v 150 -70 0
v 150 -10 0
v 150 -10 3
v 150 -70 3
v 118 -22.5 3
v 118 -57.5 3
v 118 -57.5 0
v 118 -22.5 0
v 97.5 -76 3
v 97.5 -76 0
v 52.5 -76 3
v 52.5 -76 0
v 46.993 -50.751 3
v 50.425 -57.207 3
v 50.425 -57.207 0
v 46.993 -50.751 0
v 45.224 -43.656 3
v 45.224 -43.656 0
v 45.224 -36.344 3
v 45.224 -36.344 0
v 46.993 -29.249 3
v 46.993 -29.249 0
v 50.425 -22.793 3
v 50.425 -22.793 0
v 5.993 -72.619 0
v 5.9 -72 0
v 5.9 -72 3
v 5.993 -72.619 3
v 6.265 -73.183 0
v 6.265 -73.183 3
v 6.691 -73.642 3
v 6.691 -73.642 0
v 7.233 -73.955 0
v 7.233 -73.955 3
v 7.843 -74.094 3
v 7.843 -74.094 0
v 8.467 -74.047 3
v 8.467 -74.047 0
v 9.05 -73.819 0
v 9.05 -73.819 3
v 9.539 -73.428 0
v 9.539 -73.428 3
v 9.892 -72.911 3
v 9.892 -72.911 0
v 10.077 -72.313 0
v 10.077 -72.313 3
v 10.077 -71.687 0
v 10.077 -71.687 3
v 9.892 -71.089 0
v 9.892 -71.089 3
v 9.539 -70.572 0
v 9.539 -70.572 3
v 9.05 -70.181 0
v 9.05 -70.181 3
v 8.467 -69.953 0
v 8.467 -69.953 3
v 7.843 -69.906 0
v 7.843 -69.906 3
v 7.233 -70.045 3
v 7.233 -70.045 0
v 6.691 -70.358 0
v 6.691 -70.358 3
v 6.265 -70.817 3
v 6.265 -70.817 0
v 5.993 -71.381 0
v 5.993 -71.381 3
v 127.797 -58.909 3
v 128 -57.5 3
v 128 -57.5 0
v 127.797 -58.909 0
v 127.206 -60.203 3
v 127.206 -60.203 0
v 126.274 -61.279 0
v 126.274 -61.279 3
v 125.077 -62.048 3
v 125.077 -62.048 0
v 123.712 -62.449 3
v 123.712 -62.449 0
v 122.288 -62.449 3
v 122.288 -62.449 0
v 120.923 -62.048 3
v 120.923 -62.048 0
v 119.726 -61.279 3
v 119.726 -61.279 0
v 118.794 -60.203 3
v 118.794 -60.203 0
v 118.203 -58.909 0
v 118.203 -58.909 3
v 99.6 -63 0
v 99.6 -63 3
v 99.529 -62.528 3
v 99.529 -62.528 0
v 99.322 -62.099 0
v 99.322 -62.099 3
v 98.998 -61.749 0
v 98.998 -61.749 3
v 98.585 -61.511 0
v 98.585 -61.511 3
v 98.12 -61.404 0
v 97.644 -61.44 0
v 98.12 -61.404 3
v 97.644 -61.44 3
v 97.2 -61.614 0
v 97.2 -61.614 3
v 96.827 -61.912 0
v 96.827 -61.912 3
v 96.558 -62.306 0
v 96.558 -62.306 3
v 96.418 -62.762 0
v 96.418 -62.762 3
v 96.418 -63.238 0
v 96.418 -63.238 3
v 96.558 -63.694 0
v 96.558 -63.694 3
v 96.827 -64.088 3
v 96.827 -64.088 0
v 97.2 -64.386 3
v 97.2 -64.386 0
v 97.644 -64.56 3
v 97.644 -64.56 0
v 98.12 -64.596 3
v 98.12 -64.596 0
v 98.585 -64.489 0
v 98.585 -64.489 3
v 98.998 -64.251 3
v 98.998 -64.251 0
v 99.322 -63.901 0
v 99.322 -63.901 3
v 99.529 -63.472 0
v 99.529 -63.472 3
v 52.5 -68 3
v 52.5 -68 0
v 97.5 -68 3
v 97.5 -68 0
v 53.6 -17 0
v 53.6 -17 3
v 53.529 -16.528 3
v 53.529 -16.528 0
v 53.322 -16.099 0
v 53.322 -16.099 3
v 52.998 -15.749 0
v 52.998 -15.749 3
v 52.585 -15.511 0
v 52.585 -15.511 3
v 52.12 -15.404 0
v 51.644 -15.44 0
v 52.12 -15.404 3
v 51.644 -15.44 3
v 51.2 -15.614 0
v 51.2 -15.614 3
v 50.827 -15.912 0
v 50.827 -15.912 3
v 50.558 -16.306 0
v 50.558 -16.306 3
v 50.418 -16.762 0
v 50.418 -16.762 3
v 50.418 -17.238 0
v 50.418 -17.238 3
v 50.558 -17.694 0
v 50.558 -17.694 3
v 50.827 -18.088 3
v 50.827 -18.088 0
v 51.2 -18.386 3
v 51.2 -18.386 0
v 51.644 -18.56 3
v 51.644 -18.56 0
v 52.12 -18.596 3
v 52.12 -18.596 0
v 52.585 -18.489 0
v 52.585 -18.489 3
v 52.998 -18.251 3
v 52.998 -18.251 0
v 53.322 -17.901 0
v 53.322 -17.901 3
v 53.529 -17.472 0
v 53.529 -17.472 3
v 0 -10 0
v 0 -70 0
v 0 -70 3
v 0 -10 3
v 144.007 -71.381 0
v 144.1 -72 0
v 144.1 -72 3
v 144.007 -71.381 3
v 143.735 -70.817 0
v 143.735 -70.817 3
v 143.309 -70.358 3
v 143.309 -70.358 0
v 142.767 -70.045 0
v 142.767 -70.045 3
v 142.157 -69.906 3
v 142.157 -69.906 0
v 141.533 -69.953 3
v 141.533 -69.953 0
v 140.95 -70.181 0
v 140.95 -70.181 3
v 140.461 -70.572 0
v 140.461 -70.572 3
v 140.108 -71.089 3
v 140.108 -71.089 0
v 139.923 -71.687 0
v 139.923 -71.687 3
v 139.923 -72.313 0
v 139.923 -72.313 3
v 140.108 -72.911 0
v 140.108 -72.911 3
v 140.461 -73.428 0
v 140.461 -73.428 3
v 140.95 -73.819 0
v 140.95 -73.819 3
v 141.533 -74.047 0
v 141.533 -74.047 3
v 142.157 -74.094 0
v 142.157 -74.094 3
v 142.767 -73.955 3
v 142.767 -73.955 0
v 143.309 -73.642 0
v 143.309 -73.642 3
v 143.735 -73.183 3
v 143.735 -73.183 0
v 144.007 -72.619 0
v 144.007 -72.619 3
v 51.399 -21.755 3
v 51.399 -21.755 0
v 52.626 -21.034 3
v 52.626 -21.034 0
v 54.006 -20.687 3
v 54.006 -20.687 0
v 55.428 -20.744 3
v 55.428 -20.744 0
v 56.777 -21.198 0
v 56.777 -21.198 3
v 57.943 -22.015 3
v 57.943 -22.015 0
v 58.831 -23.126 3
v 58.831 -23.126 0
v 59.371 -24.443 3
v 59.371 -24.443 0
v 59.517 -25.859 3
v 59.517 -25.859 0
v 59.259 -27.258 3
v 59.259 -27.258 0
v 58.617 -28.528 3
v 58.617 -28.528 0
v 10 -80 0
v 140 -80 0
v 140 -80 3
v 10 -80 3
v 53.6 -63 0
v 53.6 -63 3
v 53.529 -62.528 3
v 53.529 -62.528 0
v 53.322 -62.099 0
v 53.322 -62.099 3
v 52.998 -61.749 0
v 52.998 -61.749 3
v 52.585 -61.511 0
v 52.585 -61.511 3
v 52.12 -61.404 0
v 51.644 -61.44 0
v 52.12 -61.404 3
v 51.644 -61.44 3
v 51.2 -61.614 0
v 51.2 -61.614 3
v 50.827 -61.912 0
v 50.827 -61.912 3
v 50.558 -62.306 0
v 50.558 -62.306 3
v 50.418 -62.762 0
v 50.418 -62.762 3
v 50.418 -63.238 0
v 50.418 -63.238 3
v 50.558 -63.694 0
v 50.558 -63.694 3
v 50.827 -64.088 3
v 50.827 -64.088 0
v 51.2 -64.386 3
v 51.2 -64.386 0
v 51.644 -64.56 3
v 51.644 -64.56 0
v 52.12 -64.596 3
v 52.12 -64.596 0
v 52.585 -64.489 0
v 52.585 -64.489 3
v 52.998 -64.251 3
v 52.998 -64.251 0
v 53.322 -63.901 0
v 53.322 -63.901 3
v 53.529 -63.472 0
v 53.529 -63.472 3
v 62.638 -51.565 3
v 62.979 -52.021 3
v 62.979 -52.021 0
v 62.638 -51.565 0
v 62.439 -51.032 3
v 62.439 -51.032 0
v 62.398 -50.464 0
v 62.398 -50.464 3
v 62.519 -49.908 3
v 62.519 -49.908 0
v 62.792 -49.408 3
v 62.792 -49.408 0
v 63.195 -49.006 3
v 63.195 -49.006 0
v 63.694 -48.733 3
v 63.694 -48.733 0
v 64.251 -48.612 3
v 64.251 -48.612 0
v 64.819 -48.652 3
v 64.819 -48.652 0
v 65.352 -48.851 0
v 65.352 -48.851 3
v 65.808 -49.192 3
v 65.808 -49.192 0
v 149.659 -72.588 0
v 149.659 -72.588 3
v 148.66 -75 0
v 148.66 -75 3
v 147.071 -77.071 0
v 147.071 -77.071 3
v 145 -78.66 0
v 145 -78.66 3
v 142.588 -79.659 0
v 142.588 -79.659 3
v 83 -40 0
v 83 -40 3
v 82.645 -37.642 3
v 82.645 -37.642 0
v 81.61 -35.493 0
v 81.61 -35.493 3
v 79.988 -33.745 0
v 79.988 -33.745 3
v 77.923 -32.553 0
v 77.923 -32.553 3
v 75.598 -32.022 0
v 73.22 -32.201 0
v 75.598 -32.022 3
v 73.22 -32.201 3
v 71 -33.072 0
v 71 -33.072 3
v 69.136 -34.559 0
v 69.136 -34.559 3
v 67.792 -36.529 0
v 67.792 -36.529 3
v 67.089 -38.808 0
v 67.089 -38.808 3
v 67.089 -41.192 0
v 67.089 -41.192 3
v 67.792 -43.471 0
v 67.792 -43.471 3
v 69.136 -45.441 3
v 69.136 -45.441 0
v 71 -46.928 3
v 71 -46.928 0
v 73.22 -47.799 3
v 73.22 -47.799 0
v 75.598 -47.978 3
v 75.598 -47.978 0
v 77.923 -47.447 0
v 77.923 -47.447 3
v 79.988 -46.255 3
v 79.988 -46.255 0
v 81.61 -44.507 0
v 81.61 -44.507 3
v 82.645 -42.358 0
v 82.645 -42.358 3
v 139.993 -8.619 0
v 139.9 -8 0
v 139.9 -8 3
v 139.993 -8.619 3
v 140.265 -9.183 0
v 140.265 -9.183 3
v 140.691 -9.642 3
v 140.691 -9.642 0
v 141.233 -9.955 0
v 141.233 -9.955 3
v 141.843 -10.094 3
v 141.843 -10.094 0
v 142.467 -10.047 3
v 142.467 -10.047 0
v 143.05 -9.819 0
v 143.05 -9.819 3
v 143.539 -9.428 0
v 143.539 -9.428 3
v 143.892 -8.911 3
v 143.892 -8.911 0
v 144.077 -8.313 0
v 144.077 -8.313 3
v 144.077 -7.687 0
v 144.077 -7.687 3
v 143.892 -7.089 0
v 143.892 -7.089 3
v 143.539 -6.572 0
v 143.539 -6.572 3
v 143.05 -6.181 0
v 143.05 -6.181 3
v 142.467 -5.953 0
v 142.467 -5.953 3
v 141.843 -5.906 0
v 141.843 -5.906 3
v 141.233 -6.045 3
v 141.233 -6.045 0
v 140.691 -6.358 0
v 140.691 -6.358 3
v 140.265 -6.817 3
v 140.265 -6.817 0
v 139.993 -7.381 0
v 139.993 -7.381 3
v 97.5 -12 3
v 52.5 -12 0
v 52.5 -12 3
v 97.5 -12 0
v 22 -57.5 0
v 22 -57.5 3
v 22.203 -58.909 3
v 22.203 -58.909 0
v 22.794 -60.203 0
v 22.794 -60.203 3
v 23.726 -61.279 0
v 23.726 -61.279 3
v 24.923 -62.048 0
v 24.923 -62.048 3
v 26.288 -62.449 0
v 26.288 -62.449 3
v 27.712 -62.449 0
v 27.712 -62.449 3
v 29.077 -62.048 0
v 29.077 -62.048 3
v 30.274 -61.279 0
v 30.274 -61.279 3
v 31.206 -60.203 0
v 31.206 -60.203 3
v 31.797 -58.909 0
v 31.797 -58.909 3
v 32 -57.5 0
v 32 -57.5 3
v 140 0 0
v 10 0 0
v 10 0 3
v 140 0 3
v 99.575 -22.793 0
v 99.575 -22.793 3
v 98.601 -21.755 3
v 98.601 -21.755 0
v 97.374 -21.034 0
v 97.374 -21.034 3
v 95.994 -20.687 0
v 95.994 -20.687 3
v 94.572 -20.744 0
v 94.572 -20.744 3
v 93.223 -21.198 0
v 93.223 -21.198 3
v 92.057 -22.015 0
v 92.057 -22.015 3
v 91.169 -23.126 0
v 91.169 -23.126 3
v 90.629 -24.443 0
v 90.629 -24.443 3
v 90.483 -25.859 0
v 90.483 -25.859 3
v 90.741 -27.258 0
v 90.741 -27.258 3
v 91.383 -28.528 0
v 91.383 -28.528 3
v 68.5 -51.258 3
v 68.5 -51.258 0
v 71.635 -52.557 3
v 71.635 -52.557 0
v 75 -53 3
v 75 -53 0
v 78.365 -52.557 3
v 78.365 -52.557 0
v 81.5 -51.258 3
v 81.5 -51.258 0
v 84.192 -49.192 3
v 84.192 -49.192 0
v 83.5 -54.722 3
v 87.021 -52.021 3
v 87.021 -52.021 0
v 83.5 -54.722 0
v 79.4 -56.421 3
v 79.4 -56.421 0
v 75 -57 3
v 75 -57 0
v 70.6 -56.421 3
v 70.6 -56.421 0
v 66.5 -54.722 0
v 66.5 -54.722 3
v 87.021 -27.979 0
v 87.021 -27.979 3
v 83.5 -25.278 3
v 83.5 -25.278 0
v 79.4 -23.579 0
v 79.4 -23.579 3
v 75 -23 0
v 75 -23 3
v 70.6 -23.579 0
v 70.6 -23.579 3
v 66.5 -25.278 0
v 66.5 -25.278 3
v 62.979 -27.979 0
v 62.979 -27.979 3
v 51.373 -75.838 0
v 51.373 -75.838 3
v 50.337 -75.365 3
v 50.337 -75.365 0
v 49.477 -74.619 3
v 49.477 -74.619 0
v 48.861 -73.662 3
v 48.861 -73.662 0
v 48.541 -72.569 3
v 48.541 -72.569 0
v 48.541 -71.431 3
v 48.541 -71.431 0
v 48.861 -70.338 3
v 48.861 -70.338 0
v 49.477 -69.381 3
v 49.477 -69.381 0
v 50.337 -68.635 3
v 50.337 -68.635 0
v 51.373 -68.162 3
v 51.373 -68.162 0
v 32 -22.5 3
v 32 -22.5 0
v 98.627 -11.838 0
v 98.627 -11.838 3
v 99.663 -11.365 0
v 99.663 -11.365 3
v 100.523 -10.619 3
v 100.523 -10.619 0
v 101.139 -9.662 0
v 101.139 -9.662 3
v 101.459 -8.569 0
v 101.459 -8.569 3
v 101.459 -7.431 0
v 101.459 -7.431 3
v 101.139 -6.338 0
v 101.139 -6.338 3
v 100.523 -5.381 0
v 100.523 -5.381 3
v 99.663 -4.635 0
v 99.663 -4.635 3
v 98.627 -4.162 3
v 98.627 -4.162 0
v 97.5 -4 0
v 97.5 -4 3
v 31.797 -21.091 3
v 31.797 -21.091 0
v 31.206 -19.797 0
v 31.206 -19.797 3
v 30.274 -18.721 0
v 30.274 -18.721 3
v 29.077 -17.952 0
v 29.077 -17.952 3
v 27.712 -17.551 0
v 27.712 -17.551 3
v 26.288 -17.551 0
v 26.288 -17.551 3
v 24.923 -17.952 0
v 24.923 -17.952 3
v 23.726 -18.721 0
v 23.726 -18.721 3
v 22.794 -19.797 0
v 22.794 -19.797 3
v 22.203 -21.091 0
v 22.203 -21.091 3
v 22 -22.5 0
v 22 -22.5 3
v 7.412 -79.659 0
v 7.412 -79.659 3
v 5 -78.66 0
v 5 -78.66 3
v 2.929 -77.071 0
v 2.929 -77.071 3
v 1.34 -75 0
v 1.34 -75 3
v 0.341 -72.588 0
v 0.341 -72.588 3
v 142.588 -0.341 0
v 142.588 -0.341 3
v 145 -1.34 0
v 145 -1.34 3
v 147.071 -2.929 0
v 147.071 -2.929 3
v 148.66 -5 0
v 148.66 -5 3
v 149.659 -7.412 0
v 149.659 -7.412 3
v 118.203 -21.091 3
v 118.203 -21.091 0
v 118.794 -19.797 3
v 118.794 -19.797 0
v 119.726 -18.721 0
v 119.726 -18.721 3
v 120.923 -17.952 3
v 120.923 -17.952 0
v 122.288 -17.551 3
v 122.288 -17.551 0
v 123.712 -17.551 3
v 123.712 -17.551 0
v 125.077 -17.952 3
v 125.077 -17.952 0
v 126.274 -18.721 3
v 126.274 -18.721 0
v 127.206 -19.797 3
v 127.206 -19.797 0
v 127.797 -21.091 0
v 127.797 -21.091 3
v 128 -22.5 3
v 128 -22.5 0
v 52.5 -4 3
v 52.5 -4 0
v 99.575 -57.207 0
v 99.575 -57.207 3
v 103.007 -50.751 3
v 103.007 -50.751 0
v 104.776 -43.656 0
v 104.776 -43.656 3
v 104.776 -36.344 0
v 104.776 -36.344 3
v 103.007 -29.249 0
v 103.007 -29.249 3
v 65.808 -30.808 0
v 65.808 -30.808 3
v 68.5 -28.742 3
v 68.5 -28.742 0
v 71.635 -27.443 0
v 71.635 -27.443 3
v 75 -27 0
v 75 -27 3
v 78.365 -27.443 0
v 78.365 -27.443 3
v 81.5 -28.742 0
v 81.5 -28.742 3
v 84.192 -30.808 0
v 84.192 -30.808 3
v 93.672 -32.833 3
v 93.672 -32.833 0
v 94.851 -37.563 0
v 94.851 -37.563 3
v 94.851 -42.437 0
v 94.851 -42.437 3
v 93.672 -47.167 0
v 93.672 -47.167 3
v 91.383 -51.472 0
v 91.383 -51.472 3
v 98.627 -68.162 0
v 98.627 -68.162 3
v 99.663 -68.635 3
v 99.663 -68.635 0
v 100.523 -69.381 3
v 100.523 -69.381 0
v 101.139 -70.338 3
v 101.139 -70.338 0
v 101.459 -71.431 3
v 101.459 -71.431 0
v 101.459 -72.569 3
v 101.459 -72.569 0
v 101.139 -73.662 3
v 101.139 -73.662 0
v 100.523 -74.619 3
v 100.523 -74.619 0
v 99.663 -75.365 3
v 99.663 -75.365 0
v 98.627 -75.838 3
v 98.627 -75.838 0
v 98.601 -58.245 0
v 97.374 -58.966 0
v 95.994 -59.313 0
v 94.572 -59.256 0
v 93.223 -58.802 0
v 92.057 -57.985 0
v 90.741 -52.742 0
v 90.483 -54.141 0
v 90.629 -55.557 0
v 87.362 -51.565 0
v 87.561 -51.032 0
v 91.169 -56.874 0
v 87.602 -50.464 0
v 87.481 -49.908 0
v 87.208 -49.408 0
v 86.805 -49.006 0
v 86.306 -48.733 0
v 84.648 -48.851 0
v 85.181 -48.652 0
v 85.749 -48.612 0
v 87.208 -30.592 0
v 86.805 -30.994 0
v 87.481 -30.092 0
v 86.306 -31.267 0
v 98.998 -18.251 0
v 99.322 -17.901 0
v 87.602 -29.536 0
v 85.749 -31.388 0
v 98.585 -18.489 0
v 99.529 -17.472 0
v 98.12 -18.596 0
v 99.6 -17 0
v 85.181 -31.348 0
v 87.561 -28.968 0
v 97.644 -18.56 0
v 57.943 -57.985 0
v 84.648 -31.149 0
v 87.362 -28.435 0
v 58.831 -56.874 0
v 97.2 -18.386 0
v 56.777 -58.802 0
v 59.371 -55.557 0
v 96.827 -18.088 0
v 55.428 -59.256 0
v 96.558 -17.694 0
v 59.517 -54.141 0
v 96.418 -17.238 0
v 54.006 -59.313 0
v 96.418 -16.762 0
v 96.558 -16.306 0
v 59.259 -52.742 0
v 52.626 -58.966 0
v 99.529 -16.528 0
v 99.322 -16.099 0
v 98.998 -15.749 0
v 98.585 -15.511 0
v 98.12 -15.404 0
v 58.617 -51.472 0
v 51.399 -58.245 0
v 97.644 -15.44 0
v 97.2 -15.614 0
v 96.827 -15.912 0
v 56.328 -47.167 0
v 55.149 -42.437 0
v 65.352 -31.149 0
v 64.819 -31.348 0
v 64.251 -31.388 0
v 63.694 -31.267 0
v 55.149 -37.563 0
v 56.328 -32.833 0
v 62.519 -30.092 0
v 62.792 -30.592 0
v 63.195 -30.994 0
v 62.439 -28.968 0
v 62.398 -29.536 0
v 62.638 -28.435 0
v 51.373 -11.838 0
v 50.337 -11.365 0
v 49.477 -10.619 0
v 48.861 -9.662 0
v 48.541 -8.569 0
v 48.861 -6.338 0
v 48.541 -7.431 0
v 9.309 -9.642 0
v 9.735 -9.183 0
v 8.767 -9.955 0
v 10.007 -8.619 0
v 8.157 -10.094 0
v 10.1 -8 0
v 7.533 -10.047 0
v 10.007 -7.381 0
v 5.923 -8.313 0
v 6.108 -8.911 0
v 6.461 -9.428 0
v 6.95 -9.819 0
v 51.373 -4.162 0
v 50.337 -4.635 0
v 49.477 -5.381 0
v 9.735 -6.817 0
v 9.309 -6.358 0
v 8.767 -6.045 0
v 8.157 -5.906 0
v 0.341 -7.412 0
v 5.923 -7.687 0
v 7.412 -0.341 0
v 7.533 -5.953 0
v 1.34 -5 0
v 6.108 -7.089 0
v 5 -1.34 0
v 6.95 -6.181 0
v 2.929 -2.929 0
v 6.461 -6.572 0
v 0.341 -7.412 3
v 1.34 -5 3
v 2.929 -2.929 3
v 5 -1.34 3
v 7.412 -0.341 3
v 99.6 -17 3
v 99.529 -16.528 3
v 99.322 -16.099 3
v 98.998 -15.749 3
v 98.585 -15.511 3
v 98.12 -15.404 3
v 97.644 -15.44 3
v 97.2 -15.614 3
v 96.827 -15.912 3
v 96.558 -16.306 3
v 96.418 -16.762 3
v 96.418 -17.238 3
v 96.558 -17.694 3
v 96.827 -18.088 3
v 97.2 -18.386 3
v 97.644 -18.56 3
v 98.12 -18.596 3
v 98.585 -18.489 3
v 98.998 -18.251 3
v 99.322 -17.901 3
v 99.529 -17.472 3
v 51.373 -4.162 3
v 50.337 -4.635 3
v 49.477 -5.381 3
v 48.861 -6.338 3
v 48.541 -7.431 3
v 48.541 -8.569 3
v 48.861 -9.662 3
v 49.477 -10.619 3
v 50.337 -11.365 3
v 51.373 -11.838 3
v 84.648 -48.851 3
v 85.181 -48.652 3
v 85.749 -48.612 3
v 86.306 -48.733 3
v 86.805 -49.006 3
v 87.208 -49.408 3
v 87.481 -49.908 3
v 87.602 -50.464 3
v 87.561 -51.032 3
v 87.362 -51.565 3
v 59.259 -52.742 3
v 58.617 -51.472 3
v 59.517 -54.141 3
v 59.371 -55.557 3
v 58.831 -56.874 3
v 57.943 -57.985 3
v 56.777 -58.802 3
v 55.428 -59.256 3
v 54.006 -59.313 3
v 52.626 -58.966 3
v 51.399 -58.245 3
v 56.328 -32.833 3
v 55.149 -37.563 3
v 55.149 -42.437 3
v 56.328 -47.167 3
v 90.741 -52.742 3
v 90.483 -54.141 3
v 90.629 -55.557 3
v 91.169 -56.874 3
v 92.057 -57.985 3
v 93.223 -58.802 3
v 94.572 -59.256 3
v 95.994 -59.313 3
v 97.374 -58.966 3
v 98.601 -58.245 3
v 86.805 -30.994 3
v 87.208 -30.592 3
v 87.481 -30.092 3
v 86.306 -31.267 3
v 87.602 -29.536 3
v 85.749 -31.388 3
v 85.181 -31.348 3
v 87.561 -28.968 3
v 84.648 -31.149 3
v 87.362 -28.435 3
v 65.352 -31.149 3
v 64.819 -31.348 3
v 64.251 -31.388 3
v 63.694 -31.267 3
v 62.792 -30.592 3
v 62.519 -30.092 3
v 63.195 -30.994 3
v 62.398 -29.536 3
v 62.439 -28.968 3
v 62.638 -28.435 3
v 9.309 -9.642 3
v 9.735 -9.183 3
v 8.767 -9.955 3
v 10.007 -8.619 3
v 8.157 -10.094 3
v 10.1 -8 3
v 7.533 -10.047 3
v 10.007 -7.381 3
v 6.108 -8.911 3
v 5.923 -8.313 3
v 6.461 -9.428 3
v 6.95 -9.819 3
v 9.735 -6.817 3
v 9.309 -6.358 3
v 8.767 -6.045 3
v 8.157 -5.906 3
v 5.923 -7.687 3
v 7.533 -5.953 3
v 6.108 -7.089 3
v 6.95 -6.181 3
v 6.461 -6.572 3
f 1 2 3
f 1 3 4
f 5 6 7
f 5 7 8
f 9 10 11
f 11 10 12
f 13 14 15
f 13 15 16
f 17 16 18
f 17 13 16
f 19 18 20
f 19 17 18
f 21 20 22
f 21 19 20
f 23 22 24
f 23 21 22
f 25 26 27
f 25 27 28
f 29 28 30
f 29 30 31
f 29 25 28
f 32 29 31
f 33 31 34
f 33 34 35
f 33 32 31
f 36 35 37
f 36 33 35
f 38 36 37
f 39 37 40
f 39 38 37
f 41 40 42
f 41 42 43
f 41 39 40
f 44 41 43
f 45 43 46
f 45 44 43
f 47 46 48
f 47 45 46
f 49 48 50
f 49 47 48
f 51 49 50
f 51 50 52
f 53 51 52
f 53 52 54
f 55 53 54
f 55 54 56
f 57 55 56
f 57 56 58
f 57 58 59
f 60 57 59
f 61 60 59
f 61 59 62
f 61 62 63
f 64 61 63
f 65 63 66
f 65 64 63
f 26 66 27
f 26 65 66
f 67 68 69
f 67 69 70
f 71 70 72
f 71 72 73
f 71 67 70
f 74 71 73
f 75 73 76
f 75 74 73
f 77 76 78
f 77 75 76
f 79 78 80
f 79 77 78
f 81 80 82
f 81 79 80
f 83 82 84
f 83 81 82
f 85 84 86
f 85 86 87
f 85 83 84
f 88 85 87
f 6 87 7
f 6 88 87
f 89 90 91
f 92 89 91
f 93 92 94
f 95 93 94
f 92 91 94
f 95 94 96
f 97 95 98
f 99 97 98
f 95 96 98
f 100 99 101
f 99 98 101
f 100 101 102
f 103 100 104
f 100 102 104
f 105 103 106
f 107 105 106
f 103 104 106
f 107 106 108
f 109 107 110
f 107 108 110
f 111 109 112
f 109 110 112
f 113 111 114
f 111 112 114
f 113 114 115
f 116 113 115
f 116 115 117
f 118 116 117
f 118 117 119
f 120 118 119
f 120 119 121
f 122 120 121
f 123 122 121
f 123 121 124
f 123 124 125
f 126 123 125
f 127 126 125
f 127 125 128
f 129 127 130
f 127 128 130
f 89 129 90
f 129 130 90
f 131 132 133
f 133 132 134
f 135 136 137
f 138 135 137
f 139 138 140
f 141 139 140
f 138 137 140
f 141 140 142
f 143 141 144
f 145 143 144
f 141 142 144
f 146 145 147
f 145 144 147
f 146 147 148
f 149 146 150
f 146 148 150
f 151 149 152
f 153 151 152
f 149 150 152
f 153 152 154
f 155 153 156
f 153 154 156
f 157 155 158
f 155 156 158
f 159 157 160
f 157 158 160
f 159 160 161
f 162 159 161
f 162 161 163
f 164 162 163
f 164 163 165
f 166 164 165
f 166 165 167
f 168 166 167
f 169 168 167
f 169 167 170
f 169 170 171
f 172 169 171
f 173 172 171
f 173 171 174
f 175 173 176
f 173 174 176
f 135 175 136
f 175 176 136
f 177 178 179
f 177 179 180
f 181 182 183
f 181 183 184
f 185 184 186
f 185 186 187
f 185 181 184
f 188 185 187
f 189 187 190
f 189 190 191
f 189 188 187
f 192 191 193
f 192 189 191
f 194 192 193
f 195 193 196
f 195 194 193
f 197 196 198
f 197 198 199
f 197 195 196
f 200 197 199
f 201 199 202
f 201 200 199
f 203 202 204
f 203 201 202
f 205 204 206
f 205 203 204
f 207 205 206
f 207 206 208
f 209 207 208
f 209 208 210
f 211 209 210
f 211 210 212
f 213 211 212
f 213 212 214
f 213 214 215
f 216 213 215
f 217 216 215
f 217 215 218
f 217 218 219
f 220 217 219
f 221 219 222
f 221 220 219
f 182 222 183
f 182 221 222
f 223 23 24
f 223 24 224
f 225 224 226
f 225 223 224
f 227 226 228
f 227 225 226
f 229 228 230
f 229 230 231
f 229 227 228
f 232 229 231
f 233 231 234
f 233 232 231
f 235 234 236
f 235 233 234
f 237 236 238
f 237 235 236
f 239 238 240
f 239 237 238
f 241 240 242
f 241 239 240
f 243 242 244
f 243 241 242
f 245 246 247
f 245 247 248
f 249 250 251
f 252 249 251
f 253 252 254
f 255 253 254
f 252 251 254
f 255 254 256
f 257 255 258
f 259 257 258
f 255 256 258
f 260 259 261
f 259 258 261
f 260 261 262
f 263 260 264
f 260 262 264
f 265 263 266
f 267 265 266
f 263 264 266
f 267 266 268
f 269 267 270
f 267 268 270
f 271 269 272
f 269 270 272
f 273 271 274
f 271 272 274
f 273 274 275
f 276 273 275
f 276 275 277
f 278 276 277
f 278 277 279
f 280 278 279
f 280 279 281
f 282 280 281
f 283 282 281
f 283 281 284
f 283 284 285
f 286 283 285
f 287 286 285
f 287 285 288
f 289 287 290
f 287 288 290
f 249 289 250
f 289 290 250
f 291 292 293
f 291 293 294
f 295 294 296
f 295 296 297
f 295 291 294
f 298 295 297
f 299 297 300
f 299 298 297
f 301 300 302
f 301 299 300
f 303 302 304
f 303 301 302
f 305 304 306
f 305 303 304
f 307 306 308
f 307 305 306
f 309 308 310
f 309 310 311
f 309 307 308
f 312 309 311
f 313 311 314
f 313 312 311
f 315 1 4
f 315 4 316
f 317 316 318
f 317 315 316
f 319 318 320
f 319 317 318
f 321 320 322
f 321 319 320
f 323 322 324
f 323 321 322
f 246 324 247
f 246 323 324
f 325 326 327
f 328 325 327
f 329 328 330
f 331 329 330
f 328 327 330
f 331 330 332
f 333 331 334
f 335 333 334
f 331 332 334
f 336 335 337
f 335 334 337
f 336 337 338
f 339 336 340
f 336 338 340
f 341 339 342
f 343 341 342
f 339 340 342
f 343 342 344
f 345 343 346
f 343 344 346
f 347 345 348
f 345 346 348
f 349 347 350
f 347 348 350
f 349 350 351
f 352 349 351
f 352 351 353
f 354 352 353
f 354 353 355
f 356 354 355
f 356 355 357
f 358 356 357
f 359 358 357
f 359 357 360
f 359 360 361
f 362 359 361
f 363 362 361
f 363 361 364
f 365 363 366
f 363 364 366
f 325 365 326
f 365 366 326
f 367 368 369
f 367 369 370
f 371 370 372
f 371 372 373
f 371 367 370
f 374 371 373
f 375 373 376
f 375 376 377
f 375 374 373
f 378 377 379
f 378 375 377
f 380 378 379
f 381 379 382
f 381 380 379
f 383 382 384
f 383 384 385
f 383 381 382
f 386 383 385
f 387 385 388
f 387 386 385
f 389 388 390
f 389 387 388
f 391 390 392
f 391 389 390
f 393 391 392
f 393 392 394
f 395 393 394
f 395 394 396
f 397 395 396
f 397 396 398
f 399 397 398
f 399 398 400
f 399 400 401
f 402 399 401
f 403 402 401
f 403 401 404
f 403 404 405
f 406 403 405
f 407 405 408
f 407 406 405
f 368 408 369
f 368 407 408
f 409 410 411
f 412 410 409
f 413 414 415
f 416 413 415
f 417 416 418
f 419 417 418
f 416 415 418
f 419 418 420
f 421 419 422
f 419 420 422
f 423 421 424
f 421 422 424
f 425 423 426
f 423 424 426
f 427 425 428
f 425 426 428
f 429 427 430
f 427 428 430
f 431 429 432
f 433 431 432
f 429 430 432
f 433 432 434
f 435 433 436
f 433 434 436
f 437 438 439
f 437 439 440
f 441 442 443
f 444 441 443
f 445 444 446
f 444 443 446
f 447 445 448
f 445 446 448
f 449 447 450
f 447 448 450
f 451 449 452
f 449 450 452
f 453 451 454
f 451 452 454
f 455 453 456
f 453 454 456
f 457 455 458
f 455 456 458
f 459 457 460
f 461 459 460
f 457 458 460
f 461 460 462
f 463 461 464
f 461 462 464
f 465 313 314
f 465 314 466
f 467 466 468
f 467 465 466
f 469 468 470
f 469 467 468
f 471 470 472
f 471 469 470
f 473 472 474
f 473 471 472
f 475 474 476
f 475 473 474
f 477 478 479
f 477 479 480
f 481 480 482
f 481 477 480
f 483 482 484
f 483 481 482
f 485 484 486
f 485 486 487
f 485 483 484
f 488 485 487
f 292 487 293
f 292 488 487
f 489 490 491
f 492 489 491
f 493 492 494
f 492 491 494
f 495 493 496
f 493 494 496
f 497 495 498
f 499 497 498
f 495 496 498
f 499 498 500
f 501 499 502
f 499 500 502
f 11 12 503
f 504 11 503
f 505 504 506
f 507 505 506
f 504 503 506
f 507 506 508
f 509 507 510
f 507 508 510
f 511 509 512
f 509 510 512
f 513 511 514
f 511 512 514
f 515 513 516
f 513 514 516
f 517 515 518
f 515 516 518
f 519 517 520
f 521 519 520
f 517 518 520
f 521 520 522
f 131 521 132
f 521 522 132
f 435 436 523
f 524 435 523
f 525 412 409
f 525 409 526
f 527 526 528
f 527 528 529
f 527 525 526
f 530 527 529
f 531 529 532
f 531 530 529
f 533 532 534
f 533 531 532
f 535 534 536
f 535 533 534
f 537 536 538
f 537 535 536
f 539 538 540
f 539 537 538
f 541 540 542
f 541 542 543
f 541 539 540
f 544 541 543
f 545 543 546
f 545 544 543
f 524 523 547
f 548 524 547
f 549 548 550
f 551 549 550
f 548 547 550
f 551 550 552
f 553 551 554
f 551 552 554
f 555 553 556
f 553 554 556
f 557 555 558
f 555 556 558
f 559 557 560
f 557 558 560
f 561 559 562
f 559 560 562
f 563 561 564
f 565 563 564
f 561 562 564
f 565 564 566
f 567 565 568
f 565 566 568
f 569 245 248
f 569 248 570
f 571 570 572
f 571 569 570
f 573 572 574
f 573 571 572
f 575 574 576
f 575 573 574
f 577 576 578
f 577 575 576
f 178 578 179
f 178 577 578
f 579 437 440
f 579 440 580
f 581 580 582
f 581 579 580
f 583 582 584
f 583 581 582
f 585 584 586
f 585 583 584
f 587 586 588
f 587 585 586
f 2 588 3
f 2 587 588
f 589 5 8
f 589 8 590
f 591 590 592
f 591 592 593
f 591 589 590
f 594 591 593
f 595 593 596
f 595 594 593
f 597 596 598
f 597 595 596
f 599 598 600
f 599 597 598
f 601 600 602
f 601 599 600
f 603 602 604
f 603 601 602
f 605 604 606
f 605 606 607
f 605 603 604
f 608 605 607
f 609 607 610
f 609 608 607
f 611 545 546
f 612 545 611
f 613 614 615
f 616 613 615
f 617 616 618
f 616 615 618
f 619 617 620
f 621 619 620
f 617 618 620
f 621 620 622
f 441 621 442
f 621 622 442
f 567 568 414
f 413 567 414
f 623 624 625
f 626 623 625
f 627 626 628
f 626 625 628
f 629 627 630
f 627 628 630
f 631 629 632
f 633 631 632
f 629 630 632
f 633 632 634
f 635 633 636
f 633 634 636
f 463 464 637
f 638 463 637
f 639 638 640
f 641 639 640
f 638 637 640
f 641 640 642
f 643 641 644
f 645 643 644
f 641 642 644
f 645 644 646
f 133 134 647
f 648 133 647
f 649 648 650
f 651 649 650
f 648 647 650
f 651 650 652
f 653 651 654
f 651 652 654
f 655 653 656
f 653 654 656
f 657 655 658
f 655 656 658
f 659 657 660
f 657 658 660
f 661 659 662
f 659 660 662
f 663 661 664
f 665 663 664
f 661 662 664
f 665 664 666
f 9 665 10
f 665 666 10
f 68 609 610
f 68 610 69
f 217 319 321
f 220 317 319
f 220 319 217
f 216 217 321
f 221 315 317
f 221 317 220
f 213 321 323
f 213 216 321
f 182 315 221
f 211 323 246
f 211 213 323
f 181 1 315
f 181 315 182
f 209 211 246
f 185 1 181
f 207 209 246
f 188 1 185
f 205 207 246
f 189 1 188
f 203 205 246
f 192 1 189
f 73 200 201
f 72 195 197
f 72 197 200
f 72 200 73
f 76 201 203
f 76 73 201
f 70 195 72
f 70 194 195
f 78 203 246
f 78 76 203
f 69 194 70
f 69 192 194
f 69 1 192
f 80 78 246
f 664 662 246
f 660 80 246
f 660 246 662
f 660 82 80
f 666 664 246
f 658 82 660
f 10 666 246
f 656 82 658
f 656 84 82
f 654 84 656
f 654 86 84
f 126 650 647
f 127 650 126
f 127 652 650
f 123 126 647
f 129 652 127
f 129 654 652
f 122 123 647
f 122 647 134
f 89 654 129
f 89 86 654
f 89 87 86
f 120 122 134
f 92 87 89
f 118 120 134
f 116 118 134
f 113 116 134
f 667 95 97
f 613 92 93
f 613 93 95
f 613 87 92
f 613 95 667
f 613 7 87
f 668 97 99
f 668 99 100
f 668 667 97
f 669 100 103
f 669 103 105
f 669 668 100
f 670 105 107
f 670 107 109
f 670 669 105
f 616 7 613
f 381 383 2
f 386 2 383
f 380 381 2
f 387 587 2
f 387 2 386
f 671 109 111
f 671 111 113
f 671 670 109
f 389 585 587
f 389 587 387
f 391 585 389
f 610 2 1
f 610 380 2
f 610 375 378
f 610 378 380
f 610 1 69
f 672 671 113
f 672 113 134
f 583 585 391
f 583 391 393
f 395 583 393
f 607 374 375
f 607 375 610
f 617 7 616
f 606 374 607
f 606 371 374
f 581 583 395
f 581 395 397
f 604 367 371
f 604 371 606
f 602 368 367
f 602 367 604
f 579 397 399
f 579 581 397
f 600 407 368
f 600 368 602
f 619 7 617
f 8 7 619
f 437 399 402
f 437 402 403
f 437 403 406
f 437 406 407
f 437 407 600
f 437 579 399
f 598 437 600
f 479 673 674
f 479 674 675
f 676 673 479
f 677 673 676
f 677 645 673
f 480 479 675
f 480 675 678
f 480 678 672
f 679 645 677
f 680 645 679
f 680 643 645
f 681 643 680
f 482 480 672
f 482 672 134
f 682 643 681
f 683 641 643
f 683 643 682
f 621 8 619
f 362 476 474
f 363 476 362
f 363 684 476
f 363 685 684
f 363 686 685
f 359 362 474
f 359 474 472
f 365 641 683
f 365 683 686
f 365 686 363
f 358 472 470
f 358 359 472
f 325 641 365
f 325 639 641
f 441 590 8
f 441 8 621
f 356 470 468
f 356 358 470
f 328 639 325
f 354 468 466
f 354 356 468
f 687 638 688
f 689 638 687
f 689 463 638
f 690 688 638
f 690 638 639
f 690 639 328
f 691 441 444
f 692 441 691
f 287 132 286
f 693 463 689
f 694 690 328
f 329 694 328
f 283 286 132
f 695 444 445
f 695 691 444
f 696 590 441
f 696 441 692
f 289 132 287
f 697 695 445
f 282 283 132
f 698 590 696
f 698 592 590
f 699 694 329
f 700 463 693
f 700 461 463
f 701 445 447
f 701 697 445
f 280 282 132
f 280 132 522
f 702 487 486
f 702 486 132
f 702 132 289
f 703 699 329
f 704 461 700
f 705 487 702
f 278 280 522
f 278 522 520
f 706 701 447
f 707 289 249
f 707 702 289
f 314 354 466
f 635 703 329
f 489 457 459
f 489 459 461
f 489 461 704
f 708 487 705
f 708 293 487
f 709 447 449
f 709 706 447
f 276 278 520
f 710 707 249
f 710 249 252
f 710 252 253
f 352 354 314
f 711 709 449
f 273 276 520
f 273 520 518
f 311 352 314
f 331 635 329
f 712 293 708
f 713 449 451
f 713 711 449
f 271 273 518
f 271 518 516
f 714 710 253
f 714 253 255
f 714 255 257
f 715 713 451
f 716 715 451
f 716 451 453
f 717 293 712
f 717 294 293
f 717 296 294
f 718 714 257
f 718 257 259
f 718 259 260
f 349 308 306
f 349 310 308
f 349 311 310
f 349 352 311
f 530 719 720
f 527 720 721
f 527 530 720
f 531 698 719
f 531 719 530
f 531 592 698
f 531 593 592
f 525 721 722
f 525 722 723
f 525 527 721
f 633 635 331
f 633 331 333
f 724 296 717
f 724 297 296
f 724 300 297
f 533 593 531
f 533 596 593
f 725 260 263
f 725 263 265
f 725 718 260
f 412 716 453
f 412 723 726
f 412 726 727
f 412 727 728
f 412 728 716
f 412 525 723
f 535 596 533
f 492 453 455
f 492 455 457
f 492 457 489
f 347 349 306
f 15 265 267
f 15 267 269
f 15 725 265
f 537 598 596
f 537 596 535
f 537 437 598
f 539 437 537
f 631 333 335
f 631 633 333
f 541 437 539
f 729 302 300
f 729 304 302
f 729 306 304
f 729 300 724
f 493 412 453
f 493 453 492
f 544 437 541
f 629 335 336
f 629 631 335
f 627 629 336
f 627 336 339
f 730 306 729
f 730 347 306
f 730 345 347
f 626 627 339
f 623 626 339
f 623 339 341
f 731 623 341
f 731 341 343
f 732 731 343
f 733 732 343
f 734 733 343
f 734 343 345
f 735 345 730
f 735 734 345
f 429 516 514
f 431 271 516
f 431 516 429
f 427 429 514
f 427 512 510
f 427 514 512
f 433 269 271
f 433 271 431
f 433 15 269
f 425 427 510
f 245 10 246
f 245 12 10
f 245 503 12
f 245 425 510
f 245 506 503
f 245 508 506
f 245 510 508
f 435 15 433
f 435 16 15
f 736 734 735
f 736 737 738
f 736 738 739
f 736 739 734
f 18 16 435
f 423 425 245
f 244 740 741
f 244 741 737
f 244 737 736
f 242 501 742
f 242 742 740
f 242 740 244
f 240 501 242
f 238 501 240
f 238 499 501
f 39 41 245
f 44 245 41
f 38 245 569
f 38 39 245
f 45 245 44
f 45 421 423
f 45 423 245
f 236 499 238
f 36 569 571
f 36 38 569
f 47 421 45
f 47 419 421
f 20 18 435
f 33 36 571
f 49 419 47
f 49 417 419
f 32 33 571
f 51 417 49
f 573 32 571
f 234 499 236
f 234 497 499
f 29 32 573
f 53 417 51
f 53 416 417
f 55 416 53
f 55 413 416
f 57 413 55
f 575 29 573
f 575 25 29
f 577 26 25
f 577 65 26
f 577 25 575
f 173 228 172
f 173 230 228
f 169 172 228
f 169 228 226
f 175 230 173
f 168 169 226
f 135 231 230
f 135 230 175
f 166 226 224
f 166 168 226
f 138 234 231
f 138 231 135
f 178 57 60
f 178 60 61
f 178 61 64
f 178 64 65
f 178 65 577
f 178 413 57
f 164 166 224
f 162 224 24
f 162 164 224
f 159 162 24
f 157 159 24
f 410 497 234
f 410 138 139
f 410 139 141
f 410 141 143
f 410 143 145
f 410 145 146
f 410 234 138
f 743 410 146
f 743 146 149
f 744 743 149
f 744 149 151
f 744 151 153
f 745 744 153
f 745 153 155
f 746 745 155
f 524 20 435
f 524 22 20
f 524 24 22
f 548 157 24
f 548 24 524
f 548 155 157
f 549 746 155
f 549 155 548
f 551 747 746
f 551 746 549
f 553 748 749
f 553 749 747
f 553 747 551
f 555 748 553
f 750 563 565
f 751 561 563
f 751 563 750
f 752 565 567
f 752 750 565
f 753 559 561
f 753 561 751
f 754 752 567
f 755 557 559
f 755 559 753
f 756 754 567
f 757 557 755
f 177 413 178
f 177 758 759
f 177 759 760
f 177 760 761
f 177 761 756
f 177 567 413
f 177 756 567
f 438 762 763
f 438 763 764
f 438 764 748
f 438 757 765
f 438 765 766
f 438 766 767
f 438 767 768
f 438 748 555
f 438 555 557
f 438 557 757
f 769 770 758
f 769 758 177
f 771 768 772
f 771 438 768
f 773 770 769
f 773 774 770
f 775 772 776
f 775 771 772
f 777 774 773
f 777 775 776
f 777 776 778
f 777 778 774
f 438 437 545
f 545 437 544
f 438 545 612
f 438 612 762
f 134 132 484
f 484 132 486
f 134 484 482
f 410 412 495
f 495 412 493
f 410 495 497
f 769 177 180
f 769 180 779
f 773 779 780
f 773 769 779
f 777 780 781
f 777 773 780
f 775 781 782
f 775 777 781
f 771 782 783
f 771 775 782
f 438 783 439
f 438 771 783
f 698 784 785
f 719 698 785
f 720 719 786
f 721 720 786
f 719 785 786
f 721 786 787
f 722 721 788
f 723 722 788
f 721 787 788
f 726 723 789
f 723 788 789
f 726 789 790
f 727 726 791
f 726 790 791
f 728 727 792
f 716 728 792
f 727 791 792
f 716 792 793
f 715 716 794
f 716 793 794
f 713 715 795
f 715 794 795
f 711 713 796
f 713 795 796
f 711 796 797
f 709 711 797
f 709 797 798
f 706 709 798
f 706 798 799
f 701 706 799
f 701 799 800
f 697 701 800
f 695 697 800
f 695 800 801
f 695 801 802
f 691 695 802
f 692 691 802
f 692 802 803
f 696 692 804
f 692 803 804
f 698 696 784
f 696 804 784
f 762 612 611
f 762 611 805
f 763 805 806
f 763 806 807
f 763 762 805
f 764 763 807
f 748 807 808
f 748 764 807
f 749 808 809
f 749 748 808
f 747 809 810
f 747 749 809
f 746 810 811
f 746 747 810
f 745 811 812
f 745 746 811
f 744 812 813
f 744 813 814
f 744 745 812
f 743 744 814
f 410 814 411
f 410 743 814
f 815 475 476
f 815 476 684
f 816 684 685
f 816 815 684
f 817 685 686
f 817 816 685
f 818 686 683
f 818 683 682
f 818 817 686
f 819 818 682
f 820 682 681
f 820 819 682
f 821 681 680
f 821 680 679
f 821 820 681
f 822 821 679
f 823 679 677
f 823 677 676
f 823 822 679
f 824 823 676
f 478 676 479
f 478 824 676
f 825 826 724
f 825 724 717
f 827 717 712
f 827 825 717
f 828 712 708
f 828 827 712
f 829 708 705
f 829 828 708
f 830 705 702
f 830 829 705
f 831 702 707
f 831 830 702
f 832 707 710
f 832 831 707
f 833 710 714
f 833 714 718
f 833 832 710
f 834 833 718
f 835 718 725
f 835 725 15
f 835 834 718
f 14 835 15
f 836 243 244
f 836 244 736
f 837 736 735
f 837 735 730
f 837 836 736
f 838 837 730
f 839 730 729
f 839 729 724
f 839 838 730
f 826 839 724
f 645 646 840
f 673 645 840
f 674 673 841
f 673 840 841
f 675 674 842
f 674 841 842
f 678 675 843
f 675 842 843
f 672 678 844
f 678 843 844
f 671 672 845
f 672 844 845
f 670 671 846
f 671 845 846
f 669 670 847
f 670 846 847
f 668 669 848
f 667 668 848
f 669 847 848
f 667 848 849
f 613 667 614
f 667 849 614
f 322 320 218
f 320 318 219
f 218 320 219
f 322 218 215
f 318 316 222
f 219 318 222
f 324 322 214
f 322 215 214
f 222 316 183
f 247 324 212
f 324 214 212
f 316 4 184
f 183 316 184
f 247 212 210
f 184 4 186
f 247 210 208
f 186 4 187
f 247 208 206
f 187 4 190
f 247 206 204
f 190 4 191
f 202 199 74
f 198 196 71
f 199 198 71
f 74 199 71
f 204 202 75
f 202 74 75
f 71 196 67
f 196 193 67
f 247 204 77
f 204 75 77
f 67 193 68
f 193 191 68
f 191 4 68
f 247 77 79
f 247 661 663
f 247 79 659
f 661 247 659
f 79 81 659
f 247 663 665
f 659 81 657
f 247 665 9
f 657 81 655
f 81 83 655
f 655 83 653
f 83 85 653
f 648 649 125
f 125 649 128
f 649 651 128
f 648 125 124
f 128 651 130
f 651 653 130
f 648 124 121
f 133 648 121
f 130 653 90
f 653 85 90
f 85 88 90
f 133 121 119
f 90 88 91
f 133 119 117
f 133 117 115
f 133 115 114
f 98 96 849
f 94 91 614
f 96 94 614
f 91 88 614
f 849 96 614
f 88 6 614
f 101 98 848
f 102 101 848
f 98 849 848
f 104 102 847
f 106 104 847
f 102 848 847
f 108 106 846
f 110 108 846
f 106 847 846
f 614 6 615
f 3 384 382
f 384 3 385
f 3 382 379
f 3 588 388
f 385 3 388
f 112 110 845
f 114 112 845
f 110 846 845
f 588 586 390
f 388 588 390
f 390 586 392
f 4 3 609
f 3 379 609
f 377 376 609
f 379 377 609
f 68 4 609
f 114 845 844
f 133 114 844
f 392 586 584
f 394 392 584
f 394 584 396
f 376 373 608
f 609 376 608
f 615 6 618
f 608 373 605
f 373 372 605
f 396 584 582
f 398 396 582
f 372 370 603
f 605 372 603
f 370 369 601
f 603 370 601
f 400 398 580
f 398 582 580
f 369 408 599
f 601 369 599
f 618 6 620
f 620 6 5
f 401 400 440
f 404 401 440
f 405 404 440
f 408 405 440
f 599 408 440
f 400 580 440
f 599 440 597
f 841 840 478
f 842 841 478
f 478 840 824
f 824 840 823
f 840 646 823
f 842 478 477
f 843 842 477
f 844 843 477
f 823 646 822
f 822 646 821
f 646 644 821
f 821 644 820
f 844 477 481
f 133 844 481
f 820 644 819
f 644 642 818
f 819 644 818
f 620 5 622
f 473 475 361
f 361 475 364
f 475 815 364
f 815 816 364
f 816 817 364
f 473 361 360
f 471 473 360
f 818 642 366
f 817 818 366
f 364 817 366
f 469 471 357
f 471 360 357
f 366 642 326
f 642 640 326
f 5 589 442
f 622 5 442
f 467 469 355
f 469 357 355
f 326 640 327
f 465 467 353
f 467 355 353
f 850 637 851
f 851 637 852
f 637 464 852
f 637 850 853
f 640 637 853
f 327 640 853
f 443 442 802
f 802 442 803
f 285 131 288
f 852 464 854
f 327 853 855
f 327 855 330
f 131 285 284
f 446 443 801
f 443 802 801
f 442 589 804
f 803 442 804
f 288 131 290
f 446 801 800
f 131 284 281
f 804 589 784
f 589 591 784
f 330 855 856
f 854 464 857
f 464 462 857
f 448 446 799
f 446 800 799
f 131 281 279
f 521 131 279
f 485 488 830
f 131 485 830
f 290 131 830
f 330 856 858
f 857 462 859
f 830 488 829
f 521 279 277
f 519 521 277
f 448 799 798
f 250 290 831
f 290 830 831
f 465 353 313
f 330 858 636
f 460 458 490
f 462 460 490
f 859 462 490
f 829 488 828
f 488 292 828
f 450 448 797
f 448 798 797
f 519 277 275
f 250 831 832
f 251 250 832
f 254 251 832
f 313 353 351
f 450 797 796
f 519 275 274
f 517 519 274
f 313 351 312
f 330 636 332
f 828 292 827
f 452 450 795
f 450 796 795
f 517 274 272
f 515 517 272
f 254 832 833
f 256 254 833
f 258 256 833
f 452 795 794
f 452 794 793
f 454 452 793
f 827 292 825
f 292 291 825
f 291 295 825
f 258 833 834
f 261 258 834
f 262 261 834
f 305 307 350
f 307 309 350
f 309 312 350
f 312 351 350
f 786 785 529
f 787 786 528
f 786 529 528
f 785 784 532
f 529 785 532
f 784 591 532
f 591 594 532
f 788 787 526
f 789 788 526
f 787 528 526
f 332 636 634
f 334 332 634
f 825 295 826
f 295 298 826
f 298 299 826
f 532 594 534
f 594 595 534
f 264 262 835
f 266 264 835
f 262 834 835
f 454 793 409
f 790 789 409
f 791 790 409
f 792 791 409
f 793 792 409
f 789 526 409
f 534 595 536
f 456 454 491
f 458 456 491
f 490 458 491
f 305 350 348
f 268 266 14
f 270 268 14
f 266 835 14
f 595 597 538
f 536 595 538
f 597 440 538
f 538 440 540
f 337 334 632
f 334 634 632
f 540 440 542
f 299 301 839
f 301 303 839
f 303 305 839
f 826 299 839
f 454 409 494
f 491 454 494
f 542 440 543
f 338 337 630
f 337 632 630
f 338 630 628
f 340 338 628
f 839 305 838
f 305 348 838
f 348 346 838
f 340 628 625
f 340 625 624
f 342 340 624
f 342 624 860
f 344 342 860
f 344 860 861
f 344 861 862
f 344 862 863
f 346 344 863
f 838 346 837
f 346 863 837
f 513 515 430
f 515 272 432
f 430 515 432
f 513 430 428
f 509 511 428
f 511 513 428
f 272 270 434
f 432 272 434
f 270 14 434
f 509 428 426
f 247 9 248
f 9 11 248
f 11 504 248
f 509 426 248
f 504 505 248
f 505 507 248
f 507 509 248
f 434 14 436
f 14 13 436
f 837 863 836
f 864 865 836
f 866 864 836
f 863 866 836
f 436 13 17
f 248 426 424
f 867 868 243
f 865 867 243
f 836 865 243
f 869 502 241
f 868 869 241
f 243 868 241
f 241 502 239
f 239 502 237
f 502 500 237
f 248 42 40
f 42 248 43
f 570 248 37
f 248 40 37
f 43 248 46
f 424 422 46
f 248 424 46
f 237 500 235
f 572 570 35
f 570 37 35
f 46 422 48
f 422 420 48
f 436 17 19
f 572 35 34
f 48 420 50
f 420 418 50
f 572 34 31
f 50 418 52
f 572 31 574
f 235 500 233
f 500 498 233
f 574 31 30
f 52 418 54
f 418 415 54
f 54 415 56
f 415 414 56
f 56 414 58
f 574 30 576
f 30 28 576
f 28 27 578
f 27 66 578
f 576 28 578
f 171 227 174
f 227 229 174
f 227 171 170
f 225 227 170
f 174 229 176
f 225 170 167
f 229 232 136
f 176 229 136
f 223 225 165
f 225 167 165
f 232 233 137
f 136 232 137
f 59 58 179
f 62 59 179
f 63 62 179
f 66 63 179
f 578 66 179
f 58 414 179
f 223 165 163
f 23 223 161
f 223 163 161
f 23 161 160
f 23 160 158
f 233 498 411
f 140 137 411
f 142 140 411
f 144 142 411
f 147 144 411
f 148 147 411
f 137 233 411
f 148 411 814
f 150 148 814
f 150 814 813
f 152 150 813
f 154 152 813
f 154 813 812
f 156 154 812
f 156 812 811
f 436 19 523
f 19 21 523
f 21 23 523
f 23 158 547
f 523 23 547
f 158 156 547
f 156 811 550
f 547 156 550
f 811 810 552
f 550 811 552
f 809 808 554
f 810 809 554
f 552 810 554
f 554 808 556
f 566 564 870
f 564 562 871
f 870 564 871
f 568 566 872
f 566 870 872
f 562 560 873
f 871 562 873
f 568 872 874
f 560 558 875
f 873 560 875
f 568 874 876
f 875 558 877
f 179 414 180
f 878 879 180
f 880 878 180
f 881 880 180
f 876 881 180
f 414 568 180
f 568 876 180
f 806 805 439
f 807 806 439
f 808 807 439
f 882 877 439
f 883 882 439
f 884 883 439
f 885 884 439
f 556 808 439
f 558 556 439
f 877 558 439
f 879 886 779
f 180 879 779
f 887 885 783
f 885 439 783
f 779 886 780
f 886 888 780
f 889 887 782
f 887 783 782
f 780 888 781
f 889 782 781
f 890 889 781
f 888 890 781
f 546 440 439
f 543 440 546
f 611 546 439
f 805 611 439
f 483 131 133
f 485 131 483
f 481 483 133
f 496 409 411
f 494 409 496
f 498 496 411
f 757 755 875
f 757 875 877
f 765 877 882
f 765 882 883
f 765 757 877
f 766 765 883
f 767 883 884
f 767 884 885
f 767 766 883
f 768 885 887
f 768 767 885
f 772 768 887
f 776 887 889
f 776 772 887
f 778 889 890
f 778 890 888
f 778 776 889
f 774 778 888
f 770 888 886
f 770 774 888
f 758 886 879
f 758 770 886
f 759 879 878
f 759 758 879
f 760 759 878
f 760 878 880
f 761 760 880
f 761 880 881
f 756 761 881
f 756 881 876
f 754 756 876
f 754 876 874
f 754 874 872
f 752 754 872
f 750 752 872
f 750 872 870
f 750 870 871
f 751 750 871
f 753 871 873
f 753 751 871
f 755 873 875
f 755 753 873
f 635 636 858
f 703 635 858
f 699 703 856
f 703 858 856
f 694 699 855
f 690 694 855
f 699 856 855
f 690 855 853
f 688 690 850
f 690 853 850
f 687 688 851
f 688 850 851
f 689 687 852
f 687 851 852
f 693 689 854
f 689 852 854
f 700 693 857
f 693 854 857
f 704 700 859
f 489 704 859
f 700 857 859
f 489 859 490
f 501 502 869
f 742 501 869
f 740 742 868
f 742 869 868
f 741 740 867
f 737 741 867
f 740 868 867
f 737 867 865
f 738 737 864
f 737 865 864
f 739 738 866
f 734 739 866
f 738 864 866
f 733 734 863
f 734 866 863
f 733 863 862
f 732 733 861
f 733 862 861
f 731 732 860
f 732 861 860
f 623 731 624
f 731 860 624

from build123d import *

# Parameters (mm, degrees)
SKETCH_1_R          = 2.1
EXTRUDE_1_DEPTH     = 3
SKETCH_2_R          = 1.6
SKETCH_2_R_2        = 8
CUT_EXTRUDE_1_DEPTH = 3
CUT_EXTRUDE_2_DEPTH = 3
CUT_EXTRUDE_3_DEPTH = 3


with BuildPart() as part:
    # 草图1 → 凸台-拉伸1 (new body)
    with BuildSketch(Plane.XY):
        with BuildLine():
            Line((10, 0), (140, 0))
            ThreePointArc((140, 0), (147.071067812, -2.928932188), (150, -10))
            Line((150, -10), (150, -70))
            ThreePointArc((150, -70), (147.071067812, -77.071067812), (140, -80))
            Line((140, -80), (10, -80))
            ThreePointArc((10, -80), (2.928932188, -77.071067812), (0, -70))
            Line((0, -70), (0, -10))
            ThreePointArc((0, -10), (2.928932188, -2.928932188), (10, 0))
        make_face()
        with Locations((8, -8)):
            Circle(SKETCH_1_R, mode=Mode.SUBTRACT)
        with Locations(Location((8, -72, 0), (0, 0, 180))):
            Circle(SKETCH_1_R, mode=Mode.SUBTRACT)
        with Locations((142, -72)):
            Circle(SKETCH_1_R, mode=Mode.SUBTRACT)
        with Locations(Location((142, -8, 0), (0, 0, 180))):
            Circle(SKETCH_1_R, mode=Mode.SUBTRACT)
    extrude(amount=EXTRUDE_1_DEPTH)

    # 草图2 → 切除-拉伸1 (cut)
    with BuildSketch(Plane.XY.offset(3)):
        with Locations((52, -17)):
            Circle(SKETCH_2_R)
        with Locations((98, -17)):
            Circle(SKETCH_2_R)
        with Locations((98, -63)):
            Circle(SKETCH_2_R)
        with Locations((52, -63)):
            Circle(SKETCH_2_R)
        with Locations((75, -40)):
            Circle(SKETCH_2_R_2)
        with BuildLine():
            ThreePointArc((87.02081528, -27.97918472), (75, -23), (62.97918472, -27.97918472))
            ThreePointArc((62.97918472, -27.97918472), (62.97918472, -30.807611845), (65.807611845, -30.807611845))
            ThreePointArc((65.807611845, -30.807611845), (75, -27), (84.192388155, -30.807611845))
            ThreePointArc((84.192388155, -30.807611845), (87.02081528, -30.807611845), (87.02081528, -27.97918472))
        make_face()
        with BuildLine():
            ThreePointArc((87.02081528, -52.02081528), (75, -57), (62.97918472, -52.02081528))
            ThreePointArc((62.97918472, -52.02081528), (62.97918472, -49.192388155), (65.807611845, -49.192388155))
            ThreePointArc((65.807611845, -49.192388155), (75, -53), (84.192388155, -49.192388155))
            ThreePointArc((84.192388155, -49.192388155), (87.02081528, -49.192388155), (87.02081528, -52.02081528))
        make_face()
    extrude(amount=-CUT_EXTRUDE_1_DEPTH, mode=Mode.SUBTRACT)

    # 草图3 → 切除-拉伸2 (cut)
    with BuildSketch(Plane.XY.offset(3)):
        with BuildLine():
            Line((128, -22.5), (128, -57.5))
            ThreePointArc((128, -57.5), (123, -62.5), (118, -57.5))
            Line((118, -57.5), (118, -22.5))
            ThreePointArc((118, -22.5), (123, -17.5), (128, -22.5))
        make_face()
        with BuildLine():
            Line((22, -22.5), (22, -57.5))
            ThreePointArc((22, -57.5), (27, -62.5), (32, -57.5))
            Line((32, -57.5), (32, -22.5))
            ThreePointArc((32, -22.5), (27, -17.5), (22, -22.5))
        make_face()
        with BuildLine():
            ThreePointArc((99.574561329, -57.207293091), (105, -40), (99.574561329, -22.792706909))
            ThreePointArc((99.574561329, -22.792706909), (92.610918925, -21.56482887), (91.383040886, -28.528471273))
            ThreePointArc((91.383040886, -28.528471273), (95, -40), (91.383040886, -51.471528727))
            ThreePointArc((91.383040886, -51.471528727), (92.610918925, -58.43517113), (99.574561329, -57.207293091))
        make_face()
        with BuildLine():
            ThreePointArc((50.425438671, -57.207293091), (45, -40), (50.425438671, -22.792706909))
            ThreePointArc((50.425438671, -22.792706909), (57.389081075, -21.56482887), (58.616959114, -28.528471273))
            ThreePointArc((58.616959114, -28.528471273), (55, -40), (58.616959114, -51.471528727))
            ThreePointArc((58.616959114, -51.471528727), (57.389081075, -58.43517113), (50.425438671, -57.207293091))
        make_face()
    extrude(amount=-CUT_EXTRUDE_2_DEPTH, mode=Mode.SUBTRACT)

    # 草图4 → 切除-拉伸3 (cut)
    with BuildSketch(Plane(origin=(0, 0, 0), x_dir=(-1, 0, 0), z_dir=(0, 0, -1))):
        with BuildLine():
            Line((-97.5, -4), (-52.5, -4))
            ThreePointArc((-52.5, -4), (-48.5, -8), (-52.5, -12))
            Line((-52.5, -12), (-97.5, -12))
            ThreePointArc((-97.5, -12), (-101.5, -8), (-97.5, -4))
        make_face()
        with BuildLine():
            Line((-97.5, -76), (-52.5, -76))
            ThreePointArc((-52.5, -76), (-48.5, -72), (-52.5, -68))
            Line((-52.5, -68), (-97.5, -68))
            ThreePointArc((-97.5, -68), (-101.5, -72), (-97.5, -76))
        make_face()
    extrude(amount=-CUT_EXTRUDE_3_DEPTH, mode=Mode.SUBTRACT)


solid = part.part
